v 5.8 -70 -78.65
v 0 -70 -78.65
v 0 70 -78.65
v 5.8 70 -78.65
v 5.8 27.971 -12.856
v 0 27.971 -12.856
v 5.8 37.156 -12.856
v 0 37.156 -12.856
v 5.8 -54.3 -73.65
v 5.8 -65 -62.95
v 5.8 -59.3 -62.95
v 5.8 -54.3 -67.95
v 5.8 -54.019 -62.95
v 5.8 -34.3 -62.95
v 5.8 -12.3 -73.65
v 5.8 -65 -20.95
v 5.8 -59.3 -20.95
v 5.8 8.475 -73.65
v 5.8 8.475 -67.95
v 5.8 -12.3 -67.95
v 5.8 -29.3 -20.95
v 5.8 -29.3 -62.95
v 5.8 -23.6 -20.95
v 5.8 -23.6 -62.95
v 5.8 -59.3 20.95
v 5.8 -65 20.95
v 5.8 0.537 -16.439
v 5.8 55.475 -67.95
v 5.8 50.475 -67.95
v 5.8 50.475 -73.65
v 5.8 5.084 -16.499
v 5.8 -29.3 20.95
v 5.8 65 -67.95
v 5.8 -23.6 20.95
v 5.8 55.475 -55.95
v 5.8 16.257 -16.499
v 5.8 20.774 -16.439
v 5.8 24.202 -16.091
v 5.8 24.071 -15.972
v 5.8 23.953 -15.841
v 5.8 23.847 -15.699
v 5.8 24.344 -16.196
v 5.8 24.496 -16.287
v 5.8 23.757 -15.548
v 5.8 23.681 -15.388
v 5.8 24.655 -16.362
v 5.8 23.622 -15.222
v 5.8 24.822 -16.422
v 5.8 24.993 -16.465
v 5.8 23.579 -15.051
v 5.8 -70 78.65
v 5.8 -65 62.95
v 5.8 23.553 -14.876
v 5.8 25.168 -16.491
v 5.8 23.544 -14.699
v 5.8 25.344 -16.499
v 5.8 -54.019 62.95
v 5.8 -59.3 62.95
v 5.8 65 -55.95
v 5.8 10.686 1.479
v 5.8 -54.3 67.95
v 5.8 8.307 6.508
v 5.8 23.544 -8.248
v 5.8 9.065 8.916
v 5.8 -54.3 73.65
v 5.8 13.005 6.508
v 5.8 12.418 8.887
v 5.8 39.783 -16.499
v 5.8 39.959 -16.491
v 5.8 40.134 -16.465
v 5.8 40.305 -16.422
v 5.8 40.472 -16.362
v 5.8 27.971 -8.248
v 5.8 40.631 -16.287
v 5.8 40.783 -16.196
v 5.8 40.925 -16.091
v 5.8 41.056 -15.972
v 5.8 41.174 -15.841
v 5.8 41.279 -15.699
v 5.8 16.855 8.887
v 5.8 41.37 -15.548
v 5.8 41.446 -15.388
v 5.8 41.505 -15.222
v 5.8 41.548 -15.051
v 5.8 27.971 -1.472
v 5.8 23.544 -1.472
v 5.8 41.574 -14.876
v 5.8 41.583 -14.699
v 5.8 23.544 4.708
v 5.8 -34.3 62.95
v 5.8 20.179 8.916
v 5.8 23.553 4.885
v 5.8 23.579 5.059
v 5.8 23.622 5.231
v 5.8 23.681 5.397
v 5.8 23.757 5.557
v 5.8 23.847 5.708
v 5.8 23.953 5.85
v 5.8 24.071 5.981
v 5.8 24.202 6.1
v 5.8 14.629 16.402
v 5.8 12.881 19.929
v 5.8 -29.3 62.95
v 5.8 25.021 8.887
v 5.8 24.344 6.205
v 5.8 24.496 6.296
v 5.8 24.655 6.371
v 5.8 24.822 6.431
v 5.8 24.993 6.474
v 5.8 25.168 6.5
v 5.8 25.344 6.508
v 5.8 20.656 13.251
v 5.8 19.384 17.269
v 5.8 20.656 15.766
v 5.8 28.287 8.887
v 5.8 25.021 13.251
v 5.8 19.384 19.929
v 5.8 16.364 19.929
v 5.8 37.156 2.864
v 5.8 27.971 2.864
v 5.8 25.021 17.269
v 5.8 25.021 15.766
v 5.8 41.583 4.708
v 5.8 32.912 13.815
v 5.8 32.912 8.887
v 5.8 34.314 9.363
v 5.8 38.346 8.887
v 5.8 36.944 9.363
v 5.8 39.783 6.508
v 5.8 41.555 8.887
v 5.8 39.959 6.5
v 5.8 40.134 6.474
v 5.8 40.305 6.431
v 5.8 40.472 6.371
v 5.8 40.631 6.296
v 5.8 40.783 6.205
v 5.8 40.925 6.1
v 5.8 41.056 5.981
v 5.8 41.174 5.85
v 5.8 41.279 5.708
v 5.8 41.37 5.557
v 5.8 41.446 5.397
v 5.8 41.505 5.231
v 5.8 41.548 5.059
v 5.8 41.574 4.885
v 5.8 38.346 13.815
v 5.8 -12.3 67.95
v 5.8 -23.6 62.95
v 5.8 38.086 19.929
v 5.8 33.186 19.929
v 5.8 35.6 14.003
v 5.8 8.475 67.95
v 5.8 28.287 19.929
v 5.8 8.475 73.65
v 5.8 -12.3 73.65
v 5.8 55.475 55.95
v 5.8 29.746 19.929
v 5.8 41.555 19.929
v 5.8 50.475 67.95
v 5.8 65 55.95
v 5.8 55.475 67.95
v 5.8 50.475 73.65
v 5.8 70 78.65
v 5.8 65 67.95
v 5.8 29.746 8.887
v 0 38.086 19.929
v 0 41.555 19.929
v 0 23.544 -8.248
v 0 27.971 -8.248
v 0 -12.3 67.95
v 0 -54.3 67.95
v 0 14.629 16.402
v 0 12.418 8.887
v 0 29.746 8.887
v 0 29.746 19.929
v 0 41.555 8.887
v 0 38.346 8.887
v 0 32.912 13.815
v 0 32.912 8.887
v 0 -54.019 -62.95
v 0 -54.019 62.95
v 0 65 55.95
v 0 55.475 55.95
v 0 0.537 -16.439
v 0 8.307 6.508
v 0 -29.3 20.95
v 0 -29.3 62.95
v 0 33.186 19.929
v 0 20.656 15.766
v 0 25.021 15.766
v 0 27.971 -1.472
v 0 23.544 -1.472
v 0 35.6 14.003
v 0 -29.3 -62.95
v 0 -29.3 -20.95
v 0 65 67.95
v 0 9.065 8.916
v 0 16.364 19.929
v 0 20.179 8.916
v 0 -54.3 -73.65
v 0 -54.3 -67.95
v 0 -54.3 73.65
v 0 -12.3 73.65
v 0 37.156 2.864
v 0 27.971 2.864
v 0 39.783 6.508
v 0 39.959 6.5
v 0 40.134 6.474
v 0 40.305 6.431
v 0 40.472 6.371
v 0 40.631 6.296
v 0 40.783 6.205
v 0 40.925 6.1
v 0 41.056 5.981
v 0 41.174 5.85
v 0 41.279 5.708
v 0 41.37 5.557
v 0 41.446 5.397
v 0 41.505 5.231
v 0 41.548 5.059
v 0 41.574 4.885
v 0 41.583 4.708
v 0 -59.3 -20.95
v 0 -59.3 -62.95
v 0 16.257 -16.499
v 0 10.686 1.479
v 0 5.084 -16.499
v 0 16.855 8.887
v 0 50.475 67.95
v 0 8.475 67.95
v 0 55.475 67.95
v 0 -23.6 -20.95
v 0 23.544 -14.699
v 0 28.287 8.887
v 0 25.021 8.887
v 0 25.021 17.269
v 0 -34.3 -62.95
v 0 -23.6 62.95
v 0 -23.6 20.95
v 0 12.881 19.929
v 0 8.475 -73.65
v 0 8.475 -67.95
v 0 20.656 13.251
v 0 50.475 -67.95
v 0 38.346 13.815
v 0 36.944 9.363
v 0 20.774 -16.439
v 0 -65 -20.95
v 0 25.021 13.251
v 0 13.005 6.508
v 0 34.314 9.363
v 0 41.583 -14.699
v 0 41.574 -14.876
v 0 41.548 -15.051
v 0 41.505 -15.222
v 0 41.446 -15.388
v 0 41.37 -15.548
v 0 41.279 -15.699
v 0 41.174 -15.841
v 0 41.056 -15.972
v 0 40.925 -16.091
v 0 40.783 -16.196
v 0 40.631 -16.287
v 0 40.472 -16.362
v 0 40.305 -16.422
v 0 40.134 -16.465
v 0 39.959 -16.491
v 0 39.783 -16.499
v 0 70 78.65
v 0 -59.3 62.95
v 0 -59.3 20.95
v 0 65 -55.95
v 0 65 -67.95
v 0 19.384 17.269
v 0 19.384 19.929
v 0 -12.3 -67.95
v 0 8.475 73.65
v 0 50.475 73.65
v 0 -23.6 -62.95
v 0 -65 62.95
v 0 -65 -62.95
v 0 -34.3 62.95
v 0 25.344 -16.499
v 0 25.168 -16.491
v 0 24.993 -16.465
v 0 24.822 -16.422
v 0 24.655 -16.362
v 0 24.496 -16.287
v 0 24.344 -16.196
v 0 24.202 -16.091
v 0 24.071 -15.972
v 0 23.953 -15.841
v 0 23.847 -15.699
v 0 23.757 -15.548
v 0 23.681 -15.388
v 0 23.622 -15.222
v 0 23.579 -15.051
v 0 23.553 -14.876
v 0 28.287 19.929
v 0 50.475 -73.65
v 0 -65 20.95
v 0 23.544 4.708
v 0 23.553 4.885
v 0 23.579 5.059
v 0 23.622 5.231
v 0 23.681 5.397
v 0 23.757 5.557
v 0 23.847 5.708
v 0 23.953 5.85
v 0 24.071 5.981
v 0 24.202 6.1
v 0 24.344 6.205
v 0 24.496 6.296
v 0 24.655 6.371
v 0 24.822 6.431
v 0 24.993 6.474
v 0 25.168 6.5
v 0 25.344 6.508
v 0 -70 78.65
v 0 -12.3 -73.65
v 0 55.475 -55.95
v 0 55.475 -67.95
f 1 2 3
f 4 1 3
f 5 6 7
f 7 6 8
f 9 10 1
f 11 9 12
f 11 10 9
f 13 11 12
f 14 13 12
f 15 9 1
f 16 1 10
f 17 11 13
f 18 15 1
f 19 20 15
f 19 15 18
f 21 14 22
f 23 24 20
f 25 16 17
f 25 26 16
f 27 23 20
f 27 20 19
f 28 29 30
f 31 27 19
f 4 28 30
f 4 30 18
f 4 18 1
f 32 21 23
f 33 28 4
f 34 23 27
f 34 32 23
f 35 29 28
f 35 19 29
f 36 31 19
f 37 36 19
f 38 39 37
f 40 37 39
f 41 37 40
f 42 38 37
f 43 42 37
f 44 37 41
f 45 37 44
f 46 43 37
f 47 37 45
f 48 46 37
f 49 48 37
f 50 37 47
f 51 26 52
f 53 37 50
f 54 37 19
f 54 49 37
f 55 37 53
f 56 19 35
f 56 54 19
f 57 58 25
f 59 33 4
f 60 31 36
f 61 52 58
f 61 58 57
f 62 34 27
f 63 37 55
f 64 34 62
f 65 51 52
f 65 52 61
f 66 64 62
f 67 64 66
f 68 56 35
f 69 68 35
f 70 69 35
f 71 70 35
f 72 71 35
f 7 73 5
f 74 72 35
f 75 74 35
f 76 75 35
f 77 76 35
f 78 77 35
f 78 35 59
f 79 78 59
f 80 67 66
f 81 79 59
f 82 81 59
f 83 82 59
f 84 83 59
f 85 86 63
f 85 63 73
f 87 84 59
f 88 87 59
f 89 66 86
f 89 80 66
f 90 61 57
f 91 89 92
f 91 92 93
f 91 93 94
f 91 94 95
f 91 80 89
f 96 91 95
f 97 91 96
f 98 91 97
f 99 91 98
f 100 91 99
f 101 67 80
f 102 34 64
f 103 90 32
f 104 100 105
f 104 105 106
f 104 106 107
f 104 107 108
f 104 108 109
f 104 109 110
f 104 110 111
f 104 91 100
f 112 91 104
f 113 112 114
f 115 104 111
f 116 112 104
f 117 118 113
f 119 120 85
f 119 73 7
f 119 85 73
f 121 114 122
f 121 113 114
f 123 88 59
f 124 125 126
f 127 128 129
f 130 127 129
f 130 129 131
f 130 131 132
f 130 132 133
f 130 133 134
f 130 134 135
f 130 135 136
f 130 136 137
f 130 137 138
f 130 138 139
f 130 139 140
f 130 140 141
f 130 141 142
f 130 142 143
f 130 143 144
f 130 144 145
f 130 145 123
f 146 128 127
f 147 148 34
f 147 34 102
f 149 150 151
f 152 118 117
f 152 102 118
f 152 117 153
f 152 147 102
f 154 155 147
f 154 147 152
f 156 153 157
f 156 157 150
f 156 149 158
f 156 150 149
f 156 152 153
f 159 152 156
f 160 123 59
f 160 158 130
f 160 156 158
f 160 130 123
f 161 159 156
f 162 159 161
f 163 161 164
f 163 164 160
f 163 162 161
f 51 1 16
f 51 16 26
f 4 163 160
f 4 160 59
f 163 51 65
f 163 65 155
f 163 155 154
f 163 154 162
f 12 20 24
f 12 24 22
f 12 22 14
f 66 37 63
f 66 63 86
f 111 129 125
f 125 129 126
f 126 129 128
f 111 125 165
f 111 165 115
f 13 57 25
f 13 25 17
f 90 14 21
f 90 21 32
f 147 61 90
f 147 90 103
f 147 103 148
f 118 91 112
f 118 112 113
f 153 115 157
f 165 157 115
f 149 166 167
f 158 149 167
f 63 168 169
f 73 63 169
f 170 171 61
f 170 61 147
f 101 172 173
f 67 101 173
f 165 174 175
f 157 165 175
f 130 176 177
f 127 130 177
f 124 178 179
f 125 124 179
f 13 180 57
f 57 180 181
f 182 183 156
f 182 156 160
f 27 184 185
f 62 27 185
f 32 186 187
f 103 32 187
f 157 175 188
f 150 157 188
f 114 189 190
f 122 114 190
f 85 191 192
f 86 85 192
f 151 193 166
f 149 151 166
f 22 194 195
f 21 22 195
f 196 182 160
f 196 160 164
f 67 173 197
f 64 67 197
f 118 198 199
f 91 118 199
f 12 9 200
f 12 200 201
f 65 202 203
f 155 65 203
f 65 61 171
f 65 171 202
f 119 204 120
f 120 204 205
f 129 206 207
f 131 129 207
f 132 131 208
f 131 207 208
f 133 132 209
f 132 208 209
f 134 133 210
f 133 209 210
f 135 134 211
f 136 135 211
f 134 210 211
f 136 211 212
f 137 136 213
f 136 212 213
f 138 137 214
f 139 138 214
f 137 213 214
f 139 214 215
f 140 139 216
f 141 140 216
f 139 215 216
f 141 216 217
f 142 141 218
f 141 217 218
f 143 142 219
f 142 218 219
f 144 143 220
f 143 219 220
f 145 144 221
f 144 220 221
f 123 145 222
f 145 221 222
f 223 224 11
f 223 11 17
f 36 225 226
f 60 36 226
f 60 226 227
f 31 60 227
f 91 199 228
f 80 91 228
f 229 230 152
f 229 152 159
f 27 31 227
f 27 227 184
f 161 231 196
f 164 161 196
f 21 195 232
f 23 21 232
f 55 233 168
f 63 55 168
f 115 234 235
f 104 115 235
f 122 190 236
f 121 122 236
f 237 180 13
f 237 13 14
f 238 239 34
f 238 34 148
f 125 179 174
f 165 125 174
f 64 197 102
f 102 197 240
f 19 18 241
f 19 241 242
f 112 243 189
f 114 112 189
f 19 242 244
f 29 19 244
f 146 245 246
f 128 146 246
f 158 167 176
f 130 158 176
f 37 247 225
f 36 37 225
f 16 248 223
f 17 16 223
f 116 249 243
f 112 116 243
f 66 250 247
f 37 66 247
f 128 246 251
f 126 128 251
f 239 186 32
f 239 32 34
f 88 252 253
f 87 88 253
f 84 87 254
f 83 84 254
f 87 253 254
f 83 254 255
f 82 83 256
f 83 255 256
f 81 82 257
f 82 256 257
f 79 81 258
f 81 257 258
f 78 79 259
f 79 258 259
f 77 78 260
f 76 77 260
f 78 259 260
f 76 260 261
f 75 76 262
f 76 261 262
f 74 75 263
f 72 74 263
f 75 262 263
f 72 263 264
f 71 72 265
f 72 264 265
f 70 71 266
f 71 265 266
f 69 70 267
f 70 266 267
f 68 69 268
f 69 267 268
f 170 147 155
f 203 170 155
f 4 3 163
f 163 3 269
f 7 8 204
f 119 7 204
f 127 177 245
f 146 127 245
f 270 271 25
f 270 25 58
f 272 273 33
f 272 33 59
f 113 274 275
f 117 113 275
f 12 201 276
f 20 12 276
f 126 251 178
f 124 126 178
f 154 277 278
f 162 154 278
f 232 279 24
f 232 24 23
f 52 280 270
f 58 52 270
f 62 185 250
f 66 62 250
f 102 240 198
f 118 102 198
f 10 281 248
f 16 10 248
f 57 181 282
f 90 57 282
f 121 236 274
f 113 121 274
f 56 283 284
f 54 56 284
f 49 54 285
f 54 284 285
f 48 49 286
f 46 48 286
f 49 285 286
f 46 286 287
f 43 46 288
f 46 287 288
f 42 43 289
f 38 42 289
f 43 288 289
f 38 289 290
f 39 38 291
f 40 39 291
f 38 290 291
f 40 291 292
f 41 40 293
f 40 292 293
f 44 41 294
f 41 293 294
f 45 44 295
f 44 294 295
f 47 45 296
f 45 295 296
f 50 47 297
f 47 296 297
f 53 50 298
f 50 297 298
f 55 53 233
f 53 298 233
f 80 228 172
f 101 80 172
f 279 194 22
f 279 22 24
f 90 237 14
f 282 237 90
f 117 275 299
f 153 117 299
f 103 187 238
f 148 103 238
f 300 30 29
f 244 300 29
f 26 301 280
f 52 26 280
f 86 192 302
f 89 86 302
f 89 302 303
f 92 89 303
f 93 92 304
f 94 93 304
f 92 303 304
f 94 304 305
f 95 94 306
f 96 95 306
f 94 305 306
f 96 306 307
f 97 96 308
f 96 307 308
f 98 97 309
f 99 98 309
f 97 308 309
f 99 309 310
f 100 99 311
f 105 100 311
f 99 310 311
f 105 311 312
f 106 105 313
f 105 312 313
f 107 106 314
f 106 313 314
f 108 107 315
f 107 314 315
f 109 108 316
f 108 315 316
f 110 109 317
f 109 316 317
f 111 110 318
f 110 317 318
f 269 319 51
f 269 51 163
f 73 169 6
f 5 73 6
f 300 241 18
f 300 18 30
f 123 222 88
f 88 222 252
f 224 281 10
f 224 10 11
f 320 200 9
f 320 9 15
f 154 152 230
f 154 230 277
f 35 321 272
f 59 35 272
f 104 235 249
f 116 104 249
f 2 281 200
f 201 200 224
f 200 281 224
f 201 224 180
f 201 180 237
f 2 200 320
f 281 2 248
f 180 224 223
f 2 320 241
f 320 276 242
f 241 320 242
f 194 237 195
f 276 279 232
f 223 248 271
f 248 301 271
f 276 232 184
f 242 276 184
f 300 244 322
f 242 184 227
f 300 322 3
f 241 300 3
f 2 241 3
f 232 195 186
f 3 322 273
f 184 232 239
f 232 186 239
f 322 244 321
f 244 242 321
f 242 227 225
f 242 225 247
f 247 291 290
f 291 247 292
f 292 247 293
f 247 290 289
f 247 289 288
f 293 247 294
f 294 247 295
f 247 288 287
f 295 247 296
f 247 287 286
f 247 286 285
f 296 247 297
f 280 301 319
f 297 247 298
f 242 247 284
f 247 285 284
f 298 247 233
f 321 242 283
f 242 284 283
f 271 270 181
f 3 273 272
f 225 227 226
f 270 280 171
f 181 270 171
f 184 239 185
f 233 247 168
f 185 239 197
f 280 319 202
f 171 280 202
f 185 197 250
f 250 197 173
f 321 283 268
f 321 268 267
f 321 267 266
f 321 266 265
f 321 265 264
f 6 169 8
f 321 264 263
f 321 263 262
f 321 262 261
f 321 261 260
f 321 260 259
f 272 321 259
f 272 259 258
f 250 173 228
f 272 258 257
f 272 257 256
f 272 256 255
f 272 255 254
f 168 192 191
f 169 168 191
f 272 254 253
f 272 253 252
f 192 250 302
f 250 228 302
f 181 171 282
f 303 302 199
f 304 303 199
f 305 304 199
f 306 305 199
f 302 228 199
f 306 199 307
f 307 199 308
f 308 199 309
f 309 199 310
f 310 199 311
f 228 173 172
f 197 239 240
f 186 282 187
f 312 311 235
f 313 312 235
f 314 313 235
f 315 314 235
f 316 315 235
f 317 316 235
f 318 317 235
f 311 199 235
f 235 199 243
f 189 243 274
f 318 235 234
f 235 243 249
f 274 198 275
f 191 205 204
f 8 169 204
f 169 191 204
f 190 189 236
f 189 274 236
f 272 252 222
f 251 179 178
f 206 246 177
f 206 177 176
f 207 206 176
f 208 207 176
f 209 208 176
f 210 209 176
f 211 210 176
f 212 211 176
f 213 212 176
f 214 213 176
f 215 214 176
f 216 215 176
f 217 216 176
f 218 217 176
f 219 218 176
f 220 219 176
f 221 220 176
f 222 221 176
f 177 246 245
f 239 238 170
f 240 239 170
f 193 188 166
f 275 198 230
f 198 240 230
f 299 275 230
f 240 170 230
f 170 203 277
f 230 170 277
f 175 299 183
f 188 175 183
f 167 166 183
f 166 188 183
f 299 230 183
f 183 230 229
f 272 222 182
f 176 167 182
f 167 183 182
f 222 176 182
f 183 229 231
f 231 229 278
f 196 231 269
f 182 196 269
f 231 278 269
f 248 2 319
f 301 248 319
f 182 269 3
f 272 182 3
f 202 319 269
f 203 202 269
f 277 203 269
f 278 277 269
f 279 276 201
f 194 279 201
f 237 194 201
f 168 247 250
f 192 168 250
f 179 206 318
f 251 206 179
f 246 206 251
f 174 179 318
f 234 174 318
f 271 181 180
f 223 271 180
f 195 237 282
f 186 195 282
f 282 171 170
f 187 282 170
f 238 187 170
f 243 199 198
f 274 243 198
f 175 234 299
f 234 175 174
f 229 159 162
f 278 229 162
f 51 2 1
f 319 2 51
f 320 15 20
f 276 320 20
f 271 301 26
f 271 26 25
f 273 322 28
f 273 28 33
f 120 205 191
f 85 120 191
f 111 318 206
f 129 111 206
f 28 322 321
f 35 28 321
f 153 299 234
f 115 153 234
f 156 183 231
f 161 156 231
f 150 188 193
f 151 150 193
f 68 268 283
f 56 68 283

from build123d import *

# Parameters (mm, degrees)
F0_W     = 140
F0_H     = 157.3
F0_W_2   = 5.7
F0_H_2   = 42
F0_W_3   = 42
F0_H_3   = 5.7
F0_W_4   = 9.525
F0_H_4   = 12
F0_W_5   = 19.719037
F0_H_5   = 125.9
F1_DEPTH = 5.8


with BuildPart() as f1:
    # F0 (on Right) → F1 (new body)
    with BuildSketch(Plane.YZ):
        Rectangle(F0_W, F0_H)
        with Locations((-62.15, -41.95)):
            Rectangle(F0_W_2, F0_H_2, mode=Mode.SUBTRACT)
        with Locations((-33.3, -70.8)):
            Rectangle(F0_W_3, F0_H_3, mode=Mode.SUBTRACT)
        with Locations((-26.45, -41.95)):
            Rectangle(F0_W_2, F0_H_2, mode=Mode.SUBTRACT)
        with Locations((29.475, -70.8)):
            Rectangle(F0_W_3, F0_H_3, mode=Mode.SUBTRACT)
        with Locations((60.2375, -61.95)):
            Rectangle(F0_W_4, F0_H_4, mode=Mode.SUBTRACT)
        Polygon((5.084475, -16.499415), (0.537139, -16.43919), (8.306721, 6.508208), (13.00455, 6.508208), (20.774202, -16.43919), (16.257049, -16.499415), (10.685818, 1.479072), align=None, mode=Mode.SUBTRACT)
        with BuildLine():
            Line((25.34413, 6.508206), (39.782841, 6.508207))
            ThreePointArc((39.782841, 6.508207), (41.055633, 5.981), (41.582841, 4.708207))
            Line((41.582841, 4.708207), (41.582841, -14.699417))
            ThreePointArc((41.582841, -14.699417), (41.055633, -15.972209), (39.782841, -16.499417))
            Line((39.782841, -16.499417), (25.34413, -16.499416))
            ThreePointArc((25.34413, -16.499416), (24.071338, -15.972208), (23.54413, -14.699416))
            Line((23.54413, -14.699416), (23.54413, -8.248033))
            Line((23.54413, -8.248033), (27.971016, -8.248033))
            Line((27.971016, -8.248033), (27.971016, -12.855594))
            Line((27.971016, -12.855594), (37.155955, -12.855594))
            Line((37.155955, -12.855594), (37.155955, 2.864386))
            Line((37.155955, 2.864386), (27.971016, 2.864386))
            Line((27.971016, 2.864386), (27.971016, -1.472232))
            Line((27.971016, -1.472232), (23.54413, -1.472232))
            Line((23.54413, -1.472232), (23.54413, 4.708206))
            ThreePointArc((23.54413, 4.708206), (24.071338, 5.980998), (25.34413, 6.508206))
        make_face(mode=Mode.SUBTRACT)
        with Locations((-44.159518, 0)):
            Rectangle(F0_W_5, F0_H_5, mode=Mode.SUBTRACT)
        with Locations((-62.15, 41.95)):
            Rectangle(F0_W_2, F0_H_2, mode=Mode.SUBTRACT)
        with Locations((-26.45, 41.95)):
            Rectangle(F0_W_2, F0_H_2, mode=Mode.SUBTRACT)
        with Locations((-33.3, 70.8)):
            Rectangle(F0_W_3, F0_H_3, mode=Mode.SUBTRACT)
        Polygon((16.363741, 19.928689), (20.179323, 8.915522), (16.855157, 8.886603), (14.62936, 16.402229), (12.418023, 8.886603), (9.064938, 8.915522), (12.88059, 19.928689), align=None, mode=Mode.SUBTRACT)
        Polygon((20.655928, 13.251439), (20.655928, 15.766287), (25.020764, 15.766287), (25.020764, 17.269385), (19.384044, 17.269385), (19.384044, 19.928689), (28.287162, 19.928689), (28.287162, 8.886603), (25.020764, 8.886603), (25.020764, 13.251439), align=None, mode=Mode.SUBTRACT)
        Polygon((38.345925, 13.815083), (36.944045, 9.363489), (34.313589, 9.363489), (32.911639, 13.815083), (32.911639, 8.886603), (29.746389, 8.886603), (29.746389, 19.928689), (33.186231, 19.928689), (35.599863, 14.002917), (38.085792, 19.928689), (41.554554, 19.928689), (41.554554, 8.886603), (38.345925, 8.886603), align=None, mode=Mode.SUBTRACT)
        with Locations((29.475, 70.8)):
            Rectangle(F0_W_3, F0_H_3, mode=Mode.SUBTRACT)
        with Locations((60.2375, 61.95)):
            Rectangle(F0_W_4, F0_H_4, mode=Mode.SUBTRACT)
    extrude(amount=F1_DEPTH)


solid = f1.part
